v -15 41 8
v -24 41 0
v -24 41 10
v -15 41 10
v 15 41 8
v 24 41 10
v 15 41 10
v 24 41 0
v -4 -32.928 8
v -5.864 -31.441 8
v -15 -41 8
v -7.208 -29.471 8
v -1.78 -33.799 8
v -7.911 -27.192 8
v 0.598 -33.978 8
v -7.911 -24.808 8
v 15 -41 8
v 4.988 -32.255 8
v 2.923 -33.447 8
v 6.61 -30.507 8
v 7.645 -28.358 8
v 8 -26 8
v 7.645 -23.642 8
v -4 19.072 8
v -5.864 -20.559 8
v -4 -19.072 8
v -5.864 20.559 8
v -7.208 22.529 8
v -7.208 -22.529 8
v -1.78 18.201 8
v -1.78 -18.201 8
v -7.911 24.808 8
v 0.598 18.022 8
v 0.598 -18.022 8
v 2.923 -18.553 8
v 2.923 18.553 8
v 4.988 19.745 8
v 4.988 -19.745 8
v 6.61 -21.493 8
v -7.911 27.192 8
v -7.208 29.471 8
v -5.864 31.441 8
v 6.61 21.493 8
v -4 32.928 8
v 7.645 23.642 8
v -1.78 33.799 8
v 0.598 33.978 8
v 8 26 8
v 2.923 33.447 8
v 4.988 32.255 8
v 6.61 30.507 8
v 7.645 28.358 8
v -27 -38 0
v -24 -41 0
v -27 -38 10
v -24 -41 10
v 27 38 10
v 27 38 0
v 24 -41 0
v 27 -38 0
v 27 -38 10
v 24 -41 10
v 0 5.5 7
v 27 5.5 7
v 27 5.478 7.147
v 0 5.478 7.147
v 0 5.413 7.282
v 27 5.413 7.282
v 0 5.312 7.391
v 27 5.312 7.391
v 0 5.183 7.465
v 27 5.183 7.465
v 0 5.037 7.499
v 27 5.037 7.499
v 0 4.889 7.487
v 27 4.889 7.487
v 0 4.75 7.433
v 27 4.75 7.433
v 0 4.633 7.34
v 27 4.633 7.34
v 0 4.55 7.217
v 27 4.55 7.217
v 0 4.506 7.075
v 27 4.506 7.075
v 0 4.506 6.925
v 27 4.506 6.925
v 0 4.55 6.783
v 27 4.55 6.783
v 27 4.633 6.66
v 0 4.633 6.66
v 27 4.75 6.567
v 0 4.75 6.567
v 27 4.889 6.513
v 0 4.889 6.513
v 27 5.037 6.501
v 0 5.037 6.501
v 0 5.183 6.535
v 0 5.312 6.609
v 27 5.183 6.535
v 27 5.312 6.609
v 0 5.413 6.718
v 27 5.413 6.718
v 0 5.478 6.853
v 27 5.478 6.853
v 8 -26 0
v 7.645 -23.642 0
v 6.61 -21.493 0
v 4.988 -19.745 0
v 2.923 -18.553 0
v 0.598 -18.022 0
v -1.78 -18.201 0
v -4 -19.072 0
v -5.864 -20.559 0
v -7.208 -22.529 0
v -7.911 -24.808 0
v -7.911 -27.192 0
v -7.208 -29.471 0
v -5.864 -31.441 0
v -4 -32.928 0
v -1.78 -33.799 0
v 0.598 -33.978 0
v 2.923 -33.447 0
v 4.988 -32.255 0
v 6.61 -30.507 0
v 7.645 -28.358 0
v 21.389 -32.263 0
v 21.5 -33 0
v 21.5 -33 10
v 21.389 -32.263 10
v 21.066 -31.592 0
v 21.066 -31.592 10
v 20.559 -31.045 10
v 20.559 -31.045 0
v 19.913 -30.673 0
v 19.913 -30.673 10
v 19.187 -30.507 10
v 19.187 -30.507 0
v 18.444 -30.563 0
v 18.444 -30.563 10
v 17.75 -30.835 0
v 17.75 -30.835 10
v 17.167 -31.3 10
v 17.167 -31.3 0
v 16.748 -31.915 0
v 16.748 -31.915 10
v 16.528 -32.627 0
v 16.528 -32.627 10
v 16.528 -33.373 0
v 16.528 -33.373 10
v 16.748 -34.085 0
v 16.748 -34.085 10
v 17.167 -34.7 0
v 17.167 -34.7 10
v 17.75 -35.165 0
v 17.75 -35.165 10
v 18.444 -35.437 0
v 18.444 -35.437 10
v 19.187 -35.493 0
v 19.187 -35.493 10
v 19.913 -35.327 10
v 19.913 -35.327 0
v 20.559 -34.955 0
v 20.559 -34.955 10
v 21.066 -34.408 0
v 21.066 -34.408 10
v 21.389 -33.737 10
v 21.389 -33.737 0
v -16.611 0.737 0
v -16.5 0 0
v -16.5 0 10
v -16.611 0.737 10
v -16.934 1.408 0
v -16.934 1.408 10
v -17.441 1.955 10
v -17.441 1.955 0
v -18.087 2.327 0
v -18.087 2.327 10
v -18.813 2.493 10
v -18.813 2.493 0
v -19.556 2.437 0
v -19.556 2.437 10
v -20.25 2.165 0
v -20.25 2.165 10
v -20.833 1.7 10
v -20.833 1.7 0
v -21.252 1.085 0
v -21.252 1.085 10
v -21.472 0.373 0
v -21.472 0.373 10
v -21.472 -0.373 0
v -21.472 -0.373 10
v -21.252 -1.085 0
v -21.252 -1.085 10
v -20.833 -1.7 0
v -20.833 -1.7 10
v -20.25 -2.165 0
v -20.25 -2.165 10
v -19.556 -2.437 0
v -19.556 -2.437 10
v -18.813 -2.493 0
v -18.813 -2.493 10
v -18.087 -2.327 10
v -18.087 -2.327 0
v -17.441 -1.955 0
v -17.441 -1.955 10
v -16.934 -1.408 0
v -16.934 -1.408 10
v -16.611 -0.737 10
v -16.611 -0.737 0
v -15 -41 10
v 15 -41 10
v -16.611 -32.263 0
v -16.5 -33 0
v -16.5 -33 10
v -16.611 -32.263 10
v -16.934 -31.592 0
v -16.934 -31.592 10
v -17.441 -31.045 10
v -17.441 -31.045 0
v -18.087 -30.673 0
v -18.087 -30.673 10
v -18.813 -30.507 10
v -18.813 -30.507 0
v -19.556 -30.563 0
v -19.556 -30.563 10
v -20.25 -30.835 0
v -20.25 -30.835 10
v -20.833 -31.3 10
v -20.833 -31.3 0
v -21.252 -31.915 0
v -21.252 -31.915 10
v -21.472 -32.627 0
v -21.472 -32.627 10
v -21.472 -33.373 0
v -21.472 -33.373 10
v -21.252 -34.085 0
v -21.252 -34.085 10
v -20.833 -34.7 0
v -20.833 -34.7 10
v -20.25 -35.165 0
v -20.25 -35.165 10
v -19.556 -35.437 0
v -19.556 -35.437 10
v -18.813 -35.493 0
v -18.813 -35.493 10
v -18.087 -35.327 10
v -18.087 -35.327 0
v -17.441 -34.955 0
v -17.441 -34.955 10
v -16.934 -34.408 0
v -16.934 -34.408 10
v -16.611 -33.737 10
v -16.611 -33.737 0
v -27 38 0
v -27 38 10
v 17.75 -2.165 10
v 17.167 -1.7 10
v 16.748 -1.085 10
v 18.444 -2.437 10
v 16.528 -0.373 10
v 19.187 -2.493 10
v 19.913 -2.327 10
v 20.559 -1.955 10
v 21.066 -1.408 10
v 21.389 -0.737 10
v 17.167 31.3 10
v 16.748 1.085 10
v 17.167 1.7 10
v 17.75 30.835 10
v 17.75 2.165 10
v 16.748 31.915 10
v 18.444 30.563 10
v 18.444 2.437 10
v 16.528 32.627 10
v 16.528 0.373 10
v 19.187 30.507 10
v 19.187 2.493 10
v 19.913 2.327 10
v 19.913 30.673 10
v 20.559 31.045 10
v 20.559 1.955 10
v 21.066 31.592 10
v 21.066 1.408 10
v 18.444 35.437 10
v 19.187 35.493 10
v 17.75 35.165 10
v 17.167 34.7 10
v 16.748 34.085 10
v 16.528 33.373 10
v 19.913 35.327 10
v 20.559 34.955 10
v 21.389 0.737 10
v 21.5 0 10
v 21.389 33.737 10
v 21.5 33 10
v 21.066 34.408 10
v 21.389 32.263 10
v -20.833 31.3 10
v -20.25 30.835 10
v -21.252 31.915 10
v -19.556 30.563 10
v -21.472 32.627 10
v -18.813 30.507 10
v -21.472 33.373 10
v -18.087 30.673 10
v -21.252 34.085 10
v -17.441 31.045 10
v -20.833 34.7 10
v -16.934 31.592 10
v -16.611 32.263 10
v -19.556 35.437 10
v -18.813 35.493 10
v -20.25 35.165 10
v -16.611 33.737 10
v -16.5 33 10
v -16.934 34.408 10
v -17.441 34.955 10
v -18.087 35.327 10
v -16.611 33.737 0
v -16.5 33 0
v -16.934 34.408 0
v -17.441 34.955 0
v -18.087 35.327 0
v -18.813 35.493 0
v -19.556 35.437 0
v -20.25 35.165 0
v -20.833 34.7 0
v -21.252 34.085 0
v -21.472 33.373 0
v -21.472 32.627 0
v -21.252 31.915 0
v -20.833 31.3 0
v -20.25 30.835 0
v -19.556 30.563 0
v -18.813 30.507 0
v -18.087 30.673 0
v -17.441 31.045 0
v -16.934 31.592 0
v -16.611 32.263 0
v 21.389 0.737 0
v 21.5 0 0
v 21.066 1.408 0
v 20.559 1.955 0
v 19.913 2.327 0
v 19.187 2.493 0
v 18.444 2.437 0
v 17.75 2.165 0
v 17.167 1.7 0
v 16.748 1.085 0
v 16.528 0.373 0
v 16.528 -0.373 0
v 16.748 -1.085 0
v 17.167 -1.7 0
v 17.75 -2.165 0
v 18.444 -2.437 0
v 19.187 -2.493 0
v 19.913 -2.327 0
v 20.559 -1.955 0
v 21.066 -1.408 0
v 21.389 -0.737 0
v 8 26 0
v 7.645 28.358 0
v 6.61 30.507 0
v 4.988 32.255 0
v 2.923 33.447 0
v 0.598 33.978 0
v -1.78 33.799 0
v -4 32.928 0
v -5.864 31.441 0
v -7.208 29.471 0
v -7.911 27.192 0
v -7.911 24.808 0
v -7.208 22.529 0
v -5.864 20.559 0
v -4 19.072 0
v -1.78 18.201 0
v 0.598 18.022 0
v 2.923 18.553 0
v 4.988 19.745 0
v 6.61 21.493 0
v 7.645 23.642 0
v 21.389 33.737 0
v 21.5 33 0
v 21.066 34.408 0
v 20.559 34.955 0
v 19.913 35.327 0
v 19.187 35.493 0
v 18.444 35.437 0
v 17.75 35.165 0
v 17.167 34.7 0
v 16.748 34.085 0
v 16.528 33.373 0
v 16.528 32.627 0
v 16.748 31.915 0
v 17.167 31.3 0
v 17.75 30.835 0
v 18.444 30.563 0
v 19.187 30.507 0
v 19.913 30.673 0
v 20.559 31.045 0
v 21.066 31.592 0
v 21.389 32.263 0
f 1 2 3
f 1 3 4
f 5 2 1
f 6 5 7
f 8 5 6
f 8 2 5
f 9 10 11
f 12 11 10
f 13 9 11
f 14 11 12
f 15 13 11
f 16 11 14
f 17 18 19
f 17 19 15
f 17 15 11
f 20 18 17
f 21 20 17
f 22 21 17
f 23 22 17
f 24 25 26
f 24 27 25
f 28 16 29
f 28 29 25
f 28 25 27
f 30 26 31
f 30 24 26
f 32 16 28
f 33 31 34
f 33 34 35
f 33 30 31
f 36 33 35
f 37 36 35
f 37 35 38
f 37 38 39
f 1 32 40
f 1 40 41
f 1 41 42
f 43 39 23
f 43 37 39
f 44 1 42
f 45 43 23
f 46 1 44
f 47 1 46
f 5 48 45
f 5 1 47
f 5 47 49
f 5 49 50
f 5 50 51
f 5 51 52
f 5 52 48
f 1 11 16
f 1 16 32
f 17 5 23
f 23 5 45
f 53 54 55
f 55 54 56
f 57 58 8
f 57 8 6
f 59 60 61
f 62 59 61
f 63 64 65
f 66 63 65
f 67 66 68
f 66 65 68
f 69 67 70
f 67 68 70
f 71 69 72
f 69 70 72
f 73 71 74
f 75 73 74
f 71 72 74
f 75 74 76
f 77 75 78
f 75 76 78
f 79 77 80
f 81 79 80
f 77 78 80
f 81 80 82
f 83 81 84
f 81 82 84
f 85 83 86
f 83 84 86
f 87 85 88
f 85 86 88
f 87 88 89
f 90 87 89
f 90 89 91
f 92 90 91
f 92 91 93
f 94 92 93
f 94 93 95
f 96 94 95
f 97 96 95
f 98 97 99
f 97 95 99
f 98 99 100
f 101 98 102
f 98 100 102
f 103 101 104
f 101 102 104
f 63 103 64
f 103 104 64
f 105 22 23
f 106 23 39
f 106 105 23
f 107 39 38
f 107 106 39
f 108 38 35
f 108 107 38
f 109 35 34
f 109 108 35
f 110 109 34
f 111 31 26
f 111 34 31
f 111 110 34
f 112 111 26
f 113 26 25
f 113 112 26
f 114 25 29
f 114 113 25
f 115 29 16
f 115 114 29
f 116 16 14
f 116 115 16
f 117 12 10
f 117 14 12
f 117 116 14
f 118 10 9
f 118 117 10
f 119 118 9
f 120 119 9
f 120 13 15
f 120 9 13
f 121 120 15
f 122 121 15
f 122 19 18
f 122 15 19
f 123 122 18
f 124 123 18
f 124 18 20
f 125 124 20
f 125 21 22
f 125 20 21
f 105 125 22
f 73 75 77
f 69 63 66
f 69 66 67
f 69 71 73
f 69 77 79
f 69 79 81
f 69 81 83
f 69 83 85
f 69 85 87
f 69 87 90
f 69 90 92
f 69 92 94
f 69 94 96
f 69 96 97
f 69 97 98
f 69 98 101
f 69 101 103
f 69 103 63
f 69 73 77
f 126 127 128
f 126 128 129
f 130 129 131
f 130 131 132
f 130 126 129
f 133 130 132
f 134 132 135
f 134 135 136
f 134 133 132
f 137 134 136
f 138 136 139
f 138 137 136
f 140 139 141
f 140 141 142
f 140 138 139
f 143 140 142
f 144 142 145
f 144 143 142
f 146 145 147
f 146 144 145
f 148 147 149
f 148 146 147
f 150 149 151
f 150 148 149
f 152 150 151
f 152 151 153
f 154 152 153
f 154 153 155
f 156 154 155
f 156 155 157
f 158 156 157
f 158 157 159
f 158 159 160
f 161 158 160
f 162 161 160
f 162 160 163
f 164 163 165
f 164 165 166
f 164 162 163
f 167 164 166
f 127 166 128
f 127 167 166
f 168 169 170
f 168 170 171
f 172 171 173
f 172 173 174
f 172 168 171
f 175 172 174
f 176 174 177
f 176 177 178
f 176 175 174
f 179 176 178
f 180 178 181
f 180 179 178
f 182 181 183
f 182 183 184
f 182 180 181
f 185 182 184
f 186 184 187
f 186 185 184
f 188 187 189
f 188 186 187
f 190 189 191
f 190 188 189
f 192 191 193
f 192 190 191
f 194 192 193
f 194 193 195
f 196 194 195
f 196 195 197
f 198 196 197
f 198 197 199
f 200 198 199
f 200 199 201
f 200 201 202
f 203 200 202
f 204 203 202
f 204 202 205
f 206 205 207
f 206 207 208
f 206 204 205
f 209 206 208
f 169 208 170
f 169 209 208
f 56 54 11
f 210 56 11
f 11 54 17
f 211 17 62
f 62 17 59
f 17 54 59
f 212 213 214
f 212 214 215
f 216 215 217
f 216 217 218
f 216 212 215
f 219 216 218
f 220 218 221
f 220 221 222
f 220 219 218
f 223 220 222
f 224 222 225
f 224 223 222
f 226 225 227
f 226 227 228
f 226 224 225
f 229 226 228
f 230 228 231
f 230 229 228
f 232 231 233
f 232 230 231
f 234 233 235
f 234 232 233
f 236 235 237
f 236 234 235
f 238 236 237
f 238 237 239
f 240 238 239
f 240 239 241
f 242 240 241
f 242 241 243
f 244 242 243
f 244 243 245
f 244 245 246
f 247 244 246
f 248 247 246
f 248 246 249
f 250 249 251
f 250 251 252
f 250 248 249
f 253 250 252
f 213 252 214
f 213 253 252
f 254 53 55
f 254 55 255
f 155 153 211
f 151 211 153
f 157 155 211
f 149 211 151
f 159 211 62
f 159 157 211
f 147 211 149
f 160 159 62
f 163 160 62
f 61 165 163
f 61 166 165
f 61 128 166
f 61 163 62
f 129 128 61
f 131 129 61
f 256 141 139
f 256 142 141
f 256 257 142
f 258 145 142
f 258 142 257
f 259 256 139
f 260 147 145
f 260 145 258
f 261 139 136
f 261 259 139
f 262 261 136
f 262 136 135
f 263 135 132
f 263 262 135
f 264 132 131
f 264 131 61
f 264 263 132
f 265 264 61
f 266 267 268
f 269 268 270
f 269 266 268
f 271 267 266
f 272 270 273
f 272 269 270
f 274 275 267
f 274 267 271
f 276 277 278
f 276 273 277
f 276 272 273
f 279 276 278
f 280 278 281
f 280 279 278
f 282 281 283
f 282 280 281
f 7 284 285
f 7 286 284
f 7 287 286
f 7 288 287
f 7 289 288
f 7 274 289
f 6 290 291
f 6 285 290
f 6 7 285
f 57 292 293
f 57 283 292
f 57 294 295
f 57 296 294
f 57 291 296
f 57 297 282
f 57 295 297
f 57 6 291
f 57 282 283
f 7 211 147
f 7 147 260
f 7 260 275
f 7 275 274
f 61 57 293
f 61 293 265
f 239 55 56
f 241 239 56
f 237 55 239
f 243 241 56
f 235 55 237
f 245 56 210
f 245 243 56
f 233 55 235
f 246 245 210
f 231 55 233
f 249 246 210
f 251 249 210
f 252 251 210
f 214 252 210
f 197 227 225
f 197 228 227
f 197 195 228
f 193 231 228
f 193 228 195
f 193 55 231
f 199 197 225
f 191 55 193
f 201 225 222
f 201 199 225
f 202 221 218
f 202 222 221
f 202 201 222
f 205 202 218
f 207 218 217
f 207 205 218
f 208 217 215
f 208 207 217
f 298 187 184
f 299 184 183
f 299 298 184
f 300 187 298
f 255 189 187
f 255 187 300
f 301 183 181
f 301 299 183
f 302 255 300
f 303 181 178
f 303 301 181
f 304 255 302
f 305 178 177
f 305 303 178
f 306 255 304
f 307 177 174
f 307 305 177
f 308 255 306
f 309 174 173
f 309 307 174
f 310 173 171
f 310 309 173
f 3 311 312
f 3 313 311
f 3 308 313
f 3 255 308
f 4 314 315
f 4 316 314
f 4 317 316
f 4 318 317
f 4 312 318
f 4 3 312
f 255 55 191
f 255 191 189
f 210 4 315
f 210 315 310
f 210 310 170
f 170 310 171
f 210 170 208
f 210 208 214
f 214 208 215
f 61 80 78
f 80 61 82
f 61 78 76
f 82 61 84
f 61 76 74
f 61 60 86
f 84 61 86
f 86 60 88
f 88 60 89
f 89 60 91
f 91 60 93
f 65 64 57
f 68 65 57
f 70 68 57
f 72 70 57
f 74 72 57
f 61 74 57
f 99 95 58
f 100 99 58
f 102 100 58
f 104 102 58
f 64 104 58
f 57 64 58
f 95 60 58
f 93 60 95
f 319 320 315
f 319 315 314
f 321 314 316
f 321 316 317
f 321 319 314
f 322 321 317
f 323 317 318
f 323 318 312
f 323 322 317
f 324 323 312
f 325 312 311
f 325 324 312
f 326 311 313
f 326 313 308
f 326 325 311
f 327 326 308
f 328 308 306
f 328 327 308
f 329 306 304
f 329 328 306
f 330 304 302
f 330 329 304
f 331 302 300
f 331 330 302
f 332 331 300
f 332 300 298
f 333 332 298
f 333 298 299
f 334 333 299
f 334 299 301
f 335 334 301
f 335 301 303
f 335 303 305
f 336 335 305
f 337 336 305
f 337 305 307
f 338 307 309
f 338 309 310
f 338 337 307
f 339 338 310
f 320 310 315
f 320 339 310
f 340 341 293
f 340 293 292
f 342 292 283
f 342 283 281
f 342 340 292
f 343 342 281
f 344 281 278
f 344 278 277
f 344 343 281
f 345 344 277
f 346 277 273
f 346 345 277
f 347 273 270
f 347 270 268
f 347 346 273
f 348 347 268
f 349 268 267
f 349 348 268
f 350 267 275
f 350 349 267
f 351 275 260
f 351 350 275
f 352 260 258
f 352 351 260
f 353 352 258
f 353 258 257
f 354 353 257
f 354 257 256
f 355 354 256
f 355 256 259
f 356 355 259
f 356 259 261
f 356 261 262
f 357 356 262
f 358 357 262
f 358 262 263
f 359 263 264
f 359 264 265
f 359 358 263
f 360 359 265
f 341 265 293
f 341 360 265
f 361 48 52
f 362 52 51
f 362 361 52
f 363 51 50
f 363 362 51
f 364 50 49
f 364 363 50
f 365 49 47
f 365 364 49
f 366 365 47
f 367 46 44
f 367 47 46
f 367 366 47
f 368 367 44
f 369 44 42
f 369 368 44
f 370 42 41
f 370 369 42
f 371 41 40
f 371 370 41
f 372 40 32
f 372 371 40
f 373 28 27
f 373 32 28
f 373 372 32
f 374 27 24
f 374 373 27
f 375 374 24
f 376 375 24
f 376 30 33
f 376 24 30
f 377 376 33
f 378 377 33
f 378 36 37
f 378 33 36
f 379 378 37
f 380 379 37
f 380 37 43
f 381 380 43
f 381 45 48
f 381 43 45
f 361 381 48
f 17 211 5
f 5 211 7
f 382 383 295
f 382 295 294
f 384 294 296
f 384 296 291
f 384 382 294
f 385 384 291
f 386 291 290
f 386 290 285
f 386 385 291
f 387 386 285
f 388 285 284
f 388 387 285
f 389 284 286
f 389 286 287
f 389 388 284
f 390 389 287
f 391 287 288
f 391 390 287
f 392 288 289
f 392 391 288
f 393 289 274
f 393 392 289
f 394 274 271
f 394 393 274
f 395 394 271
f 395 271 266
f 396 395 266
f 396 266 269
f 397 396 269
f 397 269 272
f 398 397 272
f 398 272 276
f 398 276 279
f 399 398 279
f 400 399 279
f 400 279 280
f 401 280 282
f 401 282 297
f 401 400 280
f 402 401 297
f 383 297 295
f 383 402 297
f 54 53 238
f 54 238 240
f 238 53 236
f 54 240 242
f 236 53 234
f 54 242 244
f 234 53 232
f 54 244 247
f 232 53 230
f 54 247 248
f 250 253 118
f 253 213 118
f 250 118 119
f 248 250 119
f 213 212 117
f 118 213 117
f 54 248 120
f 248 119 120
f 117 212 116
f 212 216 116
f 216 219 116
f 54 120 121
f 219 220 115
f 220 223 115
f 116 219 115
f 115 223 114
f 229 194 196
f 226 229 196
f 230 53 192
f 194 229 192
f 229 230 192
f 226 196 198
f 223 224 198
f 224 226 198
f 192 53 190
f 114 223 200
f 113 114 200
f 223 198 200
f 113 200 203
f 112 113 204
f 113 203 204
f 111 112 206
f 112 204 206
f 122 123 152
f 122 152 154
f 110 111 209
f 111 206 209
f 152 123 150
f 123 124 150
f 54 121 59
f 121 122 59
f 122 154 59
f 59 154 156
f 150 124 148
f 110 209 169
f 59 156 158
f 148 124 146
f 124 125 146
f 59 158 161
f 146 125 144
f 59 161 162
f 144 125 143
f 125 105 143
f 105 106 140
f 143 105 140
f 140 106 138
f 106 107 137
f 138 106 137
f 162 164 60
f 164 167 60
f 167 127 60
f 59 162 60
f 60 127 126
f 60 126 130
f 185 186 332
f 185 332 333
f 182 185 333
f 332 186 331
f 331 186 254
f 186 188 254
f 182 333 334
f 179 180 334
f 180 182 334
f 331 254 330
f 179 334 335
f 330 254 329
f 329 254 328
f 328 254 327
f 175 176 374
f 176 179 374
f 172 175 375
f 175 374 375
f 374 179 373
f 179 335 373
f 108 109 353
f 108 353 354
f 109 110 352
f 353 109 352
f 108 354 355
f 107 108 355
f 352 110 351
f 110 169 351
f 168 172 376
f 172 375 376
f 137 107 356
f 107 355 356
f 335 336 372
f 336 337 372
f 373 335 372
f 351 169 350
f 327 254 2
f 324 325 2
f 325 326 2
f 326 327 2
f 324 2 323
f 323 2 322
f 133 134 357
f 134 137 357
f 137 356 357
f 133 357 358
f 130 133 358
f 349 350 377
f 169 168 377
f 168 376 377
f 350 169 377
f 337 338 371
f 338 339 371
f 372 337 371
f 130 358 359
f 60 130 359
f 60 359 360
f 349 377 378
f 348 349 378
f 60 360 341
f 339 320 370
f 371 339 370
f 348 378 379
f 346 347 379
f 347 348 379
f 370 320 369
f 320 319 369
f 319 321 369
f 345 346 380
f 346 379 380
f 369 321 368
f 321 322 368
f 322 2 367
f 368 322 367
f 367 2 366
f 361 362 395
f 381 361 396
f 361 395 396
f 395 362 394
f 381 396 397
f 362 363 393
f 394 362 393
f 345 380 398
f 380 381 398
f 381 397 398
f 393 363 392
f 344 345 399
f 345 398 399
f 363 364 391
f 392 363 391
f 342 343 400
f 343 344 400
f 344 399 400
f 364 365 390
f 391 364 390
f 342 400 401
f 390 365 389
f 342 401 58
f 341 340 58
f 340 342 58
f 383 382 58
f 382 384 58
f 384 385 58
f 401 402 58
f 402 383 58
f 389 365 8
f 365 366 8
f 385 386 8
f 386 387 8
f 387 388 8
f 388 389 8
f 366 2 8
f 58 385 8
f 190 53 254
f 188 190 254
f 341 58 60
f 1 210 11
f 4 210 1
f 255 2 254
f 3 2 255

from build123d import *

# Parameters (mm, degrees)
F0_W     = 54
F0_H     = 82
F0_R     = 2.5
F0_R_2   = 8
F1_DEPTH = 10
F2_SIZE  = 3
F3_W     = 30
F3_H     = 82
F4_DEPTH = 2
F5_R     = 0.5
F6_DEPTH = 27


with BuildPart() as f1:
    # F0 (on Top) → F1 (new body)
    with BuildSketch(Plane.XY):
        Rectangle(F0_W, F0_H)
        with Locations((-19, -33)):
            Circle(F0_R, mode=Mode.SUBTRACT)
        with Locations((0, -26)):
            Circle(F0_R_2, mode=Mode.SUBTRACT)
        with Locations((19, -33)):
            Circle(F0_R, mode=Mode.SUBTRACT)
        with Locations((-19, 0)):
            Circle(F0_R, mode=Mode.SUBTRACT)
        with Locations((-19, 33)):
            Circle(F0_R, mode=Mode.SUBTRACT)
        with Locations((19, 0)):
            Circle(F0_R, mode=Mode.SUBTRACT)
        with Locations((0, 26)):
            Circle(F0_R_2, mode=Mode.SUBTRACT)
        with Locations((19, 33)):
            Circle(F0_R, mode=Mode.SUBTRACT)
    extrude(amount=F1_DEPTH)

    # F2
    f2_edges = [f1.edges().sort_by_distance(p)[0] for p in [
        (27, -41, 5),
        (-27, -41, 5),
        (27, 41, 5),
        (-27, 41, 5),
    ]]
    chamfer(f2_edges, length=F2_SIZE)

    # F3 (on face) → F4 (cut)
    with BuildSketch(Plane.XY.offset(10)):
        Rectangle(F3_W, F3_H)
    extrude(amount=-F4_DEPTH, mode=Mode.SUBTRACT)

    # F5 (on face) → F6 (cut)
    with BuildSketch(Plane.YZ.offset(27)):
        with Locations((5, 7)):
            Circle(F5_R)
    extrude(amount=-F6_DEPTH, mode=Mode.SUBTRACT)


solid = f1.part
